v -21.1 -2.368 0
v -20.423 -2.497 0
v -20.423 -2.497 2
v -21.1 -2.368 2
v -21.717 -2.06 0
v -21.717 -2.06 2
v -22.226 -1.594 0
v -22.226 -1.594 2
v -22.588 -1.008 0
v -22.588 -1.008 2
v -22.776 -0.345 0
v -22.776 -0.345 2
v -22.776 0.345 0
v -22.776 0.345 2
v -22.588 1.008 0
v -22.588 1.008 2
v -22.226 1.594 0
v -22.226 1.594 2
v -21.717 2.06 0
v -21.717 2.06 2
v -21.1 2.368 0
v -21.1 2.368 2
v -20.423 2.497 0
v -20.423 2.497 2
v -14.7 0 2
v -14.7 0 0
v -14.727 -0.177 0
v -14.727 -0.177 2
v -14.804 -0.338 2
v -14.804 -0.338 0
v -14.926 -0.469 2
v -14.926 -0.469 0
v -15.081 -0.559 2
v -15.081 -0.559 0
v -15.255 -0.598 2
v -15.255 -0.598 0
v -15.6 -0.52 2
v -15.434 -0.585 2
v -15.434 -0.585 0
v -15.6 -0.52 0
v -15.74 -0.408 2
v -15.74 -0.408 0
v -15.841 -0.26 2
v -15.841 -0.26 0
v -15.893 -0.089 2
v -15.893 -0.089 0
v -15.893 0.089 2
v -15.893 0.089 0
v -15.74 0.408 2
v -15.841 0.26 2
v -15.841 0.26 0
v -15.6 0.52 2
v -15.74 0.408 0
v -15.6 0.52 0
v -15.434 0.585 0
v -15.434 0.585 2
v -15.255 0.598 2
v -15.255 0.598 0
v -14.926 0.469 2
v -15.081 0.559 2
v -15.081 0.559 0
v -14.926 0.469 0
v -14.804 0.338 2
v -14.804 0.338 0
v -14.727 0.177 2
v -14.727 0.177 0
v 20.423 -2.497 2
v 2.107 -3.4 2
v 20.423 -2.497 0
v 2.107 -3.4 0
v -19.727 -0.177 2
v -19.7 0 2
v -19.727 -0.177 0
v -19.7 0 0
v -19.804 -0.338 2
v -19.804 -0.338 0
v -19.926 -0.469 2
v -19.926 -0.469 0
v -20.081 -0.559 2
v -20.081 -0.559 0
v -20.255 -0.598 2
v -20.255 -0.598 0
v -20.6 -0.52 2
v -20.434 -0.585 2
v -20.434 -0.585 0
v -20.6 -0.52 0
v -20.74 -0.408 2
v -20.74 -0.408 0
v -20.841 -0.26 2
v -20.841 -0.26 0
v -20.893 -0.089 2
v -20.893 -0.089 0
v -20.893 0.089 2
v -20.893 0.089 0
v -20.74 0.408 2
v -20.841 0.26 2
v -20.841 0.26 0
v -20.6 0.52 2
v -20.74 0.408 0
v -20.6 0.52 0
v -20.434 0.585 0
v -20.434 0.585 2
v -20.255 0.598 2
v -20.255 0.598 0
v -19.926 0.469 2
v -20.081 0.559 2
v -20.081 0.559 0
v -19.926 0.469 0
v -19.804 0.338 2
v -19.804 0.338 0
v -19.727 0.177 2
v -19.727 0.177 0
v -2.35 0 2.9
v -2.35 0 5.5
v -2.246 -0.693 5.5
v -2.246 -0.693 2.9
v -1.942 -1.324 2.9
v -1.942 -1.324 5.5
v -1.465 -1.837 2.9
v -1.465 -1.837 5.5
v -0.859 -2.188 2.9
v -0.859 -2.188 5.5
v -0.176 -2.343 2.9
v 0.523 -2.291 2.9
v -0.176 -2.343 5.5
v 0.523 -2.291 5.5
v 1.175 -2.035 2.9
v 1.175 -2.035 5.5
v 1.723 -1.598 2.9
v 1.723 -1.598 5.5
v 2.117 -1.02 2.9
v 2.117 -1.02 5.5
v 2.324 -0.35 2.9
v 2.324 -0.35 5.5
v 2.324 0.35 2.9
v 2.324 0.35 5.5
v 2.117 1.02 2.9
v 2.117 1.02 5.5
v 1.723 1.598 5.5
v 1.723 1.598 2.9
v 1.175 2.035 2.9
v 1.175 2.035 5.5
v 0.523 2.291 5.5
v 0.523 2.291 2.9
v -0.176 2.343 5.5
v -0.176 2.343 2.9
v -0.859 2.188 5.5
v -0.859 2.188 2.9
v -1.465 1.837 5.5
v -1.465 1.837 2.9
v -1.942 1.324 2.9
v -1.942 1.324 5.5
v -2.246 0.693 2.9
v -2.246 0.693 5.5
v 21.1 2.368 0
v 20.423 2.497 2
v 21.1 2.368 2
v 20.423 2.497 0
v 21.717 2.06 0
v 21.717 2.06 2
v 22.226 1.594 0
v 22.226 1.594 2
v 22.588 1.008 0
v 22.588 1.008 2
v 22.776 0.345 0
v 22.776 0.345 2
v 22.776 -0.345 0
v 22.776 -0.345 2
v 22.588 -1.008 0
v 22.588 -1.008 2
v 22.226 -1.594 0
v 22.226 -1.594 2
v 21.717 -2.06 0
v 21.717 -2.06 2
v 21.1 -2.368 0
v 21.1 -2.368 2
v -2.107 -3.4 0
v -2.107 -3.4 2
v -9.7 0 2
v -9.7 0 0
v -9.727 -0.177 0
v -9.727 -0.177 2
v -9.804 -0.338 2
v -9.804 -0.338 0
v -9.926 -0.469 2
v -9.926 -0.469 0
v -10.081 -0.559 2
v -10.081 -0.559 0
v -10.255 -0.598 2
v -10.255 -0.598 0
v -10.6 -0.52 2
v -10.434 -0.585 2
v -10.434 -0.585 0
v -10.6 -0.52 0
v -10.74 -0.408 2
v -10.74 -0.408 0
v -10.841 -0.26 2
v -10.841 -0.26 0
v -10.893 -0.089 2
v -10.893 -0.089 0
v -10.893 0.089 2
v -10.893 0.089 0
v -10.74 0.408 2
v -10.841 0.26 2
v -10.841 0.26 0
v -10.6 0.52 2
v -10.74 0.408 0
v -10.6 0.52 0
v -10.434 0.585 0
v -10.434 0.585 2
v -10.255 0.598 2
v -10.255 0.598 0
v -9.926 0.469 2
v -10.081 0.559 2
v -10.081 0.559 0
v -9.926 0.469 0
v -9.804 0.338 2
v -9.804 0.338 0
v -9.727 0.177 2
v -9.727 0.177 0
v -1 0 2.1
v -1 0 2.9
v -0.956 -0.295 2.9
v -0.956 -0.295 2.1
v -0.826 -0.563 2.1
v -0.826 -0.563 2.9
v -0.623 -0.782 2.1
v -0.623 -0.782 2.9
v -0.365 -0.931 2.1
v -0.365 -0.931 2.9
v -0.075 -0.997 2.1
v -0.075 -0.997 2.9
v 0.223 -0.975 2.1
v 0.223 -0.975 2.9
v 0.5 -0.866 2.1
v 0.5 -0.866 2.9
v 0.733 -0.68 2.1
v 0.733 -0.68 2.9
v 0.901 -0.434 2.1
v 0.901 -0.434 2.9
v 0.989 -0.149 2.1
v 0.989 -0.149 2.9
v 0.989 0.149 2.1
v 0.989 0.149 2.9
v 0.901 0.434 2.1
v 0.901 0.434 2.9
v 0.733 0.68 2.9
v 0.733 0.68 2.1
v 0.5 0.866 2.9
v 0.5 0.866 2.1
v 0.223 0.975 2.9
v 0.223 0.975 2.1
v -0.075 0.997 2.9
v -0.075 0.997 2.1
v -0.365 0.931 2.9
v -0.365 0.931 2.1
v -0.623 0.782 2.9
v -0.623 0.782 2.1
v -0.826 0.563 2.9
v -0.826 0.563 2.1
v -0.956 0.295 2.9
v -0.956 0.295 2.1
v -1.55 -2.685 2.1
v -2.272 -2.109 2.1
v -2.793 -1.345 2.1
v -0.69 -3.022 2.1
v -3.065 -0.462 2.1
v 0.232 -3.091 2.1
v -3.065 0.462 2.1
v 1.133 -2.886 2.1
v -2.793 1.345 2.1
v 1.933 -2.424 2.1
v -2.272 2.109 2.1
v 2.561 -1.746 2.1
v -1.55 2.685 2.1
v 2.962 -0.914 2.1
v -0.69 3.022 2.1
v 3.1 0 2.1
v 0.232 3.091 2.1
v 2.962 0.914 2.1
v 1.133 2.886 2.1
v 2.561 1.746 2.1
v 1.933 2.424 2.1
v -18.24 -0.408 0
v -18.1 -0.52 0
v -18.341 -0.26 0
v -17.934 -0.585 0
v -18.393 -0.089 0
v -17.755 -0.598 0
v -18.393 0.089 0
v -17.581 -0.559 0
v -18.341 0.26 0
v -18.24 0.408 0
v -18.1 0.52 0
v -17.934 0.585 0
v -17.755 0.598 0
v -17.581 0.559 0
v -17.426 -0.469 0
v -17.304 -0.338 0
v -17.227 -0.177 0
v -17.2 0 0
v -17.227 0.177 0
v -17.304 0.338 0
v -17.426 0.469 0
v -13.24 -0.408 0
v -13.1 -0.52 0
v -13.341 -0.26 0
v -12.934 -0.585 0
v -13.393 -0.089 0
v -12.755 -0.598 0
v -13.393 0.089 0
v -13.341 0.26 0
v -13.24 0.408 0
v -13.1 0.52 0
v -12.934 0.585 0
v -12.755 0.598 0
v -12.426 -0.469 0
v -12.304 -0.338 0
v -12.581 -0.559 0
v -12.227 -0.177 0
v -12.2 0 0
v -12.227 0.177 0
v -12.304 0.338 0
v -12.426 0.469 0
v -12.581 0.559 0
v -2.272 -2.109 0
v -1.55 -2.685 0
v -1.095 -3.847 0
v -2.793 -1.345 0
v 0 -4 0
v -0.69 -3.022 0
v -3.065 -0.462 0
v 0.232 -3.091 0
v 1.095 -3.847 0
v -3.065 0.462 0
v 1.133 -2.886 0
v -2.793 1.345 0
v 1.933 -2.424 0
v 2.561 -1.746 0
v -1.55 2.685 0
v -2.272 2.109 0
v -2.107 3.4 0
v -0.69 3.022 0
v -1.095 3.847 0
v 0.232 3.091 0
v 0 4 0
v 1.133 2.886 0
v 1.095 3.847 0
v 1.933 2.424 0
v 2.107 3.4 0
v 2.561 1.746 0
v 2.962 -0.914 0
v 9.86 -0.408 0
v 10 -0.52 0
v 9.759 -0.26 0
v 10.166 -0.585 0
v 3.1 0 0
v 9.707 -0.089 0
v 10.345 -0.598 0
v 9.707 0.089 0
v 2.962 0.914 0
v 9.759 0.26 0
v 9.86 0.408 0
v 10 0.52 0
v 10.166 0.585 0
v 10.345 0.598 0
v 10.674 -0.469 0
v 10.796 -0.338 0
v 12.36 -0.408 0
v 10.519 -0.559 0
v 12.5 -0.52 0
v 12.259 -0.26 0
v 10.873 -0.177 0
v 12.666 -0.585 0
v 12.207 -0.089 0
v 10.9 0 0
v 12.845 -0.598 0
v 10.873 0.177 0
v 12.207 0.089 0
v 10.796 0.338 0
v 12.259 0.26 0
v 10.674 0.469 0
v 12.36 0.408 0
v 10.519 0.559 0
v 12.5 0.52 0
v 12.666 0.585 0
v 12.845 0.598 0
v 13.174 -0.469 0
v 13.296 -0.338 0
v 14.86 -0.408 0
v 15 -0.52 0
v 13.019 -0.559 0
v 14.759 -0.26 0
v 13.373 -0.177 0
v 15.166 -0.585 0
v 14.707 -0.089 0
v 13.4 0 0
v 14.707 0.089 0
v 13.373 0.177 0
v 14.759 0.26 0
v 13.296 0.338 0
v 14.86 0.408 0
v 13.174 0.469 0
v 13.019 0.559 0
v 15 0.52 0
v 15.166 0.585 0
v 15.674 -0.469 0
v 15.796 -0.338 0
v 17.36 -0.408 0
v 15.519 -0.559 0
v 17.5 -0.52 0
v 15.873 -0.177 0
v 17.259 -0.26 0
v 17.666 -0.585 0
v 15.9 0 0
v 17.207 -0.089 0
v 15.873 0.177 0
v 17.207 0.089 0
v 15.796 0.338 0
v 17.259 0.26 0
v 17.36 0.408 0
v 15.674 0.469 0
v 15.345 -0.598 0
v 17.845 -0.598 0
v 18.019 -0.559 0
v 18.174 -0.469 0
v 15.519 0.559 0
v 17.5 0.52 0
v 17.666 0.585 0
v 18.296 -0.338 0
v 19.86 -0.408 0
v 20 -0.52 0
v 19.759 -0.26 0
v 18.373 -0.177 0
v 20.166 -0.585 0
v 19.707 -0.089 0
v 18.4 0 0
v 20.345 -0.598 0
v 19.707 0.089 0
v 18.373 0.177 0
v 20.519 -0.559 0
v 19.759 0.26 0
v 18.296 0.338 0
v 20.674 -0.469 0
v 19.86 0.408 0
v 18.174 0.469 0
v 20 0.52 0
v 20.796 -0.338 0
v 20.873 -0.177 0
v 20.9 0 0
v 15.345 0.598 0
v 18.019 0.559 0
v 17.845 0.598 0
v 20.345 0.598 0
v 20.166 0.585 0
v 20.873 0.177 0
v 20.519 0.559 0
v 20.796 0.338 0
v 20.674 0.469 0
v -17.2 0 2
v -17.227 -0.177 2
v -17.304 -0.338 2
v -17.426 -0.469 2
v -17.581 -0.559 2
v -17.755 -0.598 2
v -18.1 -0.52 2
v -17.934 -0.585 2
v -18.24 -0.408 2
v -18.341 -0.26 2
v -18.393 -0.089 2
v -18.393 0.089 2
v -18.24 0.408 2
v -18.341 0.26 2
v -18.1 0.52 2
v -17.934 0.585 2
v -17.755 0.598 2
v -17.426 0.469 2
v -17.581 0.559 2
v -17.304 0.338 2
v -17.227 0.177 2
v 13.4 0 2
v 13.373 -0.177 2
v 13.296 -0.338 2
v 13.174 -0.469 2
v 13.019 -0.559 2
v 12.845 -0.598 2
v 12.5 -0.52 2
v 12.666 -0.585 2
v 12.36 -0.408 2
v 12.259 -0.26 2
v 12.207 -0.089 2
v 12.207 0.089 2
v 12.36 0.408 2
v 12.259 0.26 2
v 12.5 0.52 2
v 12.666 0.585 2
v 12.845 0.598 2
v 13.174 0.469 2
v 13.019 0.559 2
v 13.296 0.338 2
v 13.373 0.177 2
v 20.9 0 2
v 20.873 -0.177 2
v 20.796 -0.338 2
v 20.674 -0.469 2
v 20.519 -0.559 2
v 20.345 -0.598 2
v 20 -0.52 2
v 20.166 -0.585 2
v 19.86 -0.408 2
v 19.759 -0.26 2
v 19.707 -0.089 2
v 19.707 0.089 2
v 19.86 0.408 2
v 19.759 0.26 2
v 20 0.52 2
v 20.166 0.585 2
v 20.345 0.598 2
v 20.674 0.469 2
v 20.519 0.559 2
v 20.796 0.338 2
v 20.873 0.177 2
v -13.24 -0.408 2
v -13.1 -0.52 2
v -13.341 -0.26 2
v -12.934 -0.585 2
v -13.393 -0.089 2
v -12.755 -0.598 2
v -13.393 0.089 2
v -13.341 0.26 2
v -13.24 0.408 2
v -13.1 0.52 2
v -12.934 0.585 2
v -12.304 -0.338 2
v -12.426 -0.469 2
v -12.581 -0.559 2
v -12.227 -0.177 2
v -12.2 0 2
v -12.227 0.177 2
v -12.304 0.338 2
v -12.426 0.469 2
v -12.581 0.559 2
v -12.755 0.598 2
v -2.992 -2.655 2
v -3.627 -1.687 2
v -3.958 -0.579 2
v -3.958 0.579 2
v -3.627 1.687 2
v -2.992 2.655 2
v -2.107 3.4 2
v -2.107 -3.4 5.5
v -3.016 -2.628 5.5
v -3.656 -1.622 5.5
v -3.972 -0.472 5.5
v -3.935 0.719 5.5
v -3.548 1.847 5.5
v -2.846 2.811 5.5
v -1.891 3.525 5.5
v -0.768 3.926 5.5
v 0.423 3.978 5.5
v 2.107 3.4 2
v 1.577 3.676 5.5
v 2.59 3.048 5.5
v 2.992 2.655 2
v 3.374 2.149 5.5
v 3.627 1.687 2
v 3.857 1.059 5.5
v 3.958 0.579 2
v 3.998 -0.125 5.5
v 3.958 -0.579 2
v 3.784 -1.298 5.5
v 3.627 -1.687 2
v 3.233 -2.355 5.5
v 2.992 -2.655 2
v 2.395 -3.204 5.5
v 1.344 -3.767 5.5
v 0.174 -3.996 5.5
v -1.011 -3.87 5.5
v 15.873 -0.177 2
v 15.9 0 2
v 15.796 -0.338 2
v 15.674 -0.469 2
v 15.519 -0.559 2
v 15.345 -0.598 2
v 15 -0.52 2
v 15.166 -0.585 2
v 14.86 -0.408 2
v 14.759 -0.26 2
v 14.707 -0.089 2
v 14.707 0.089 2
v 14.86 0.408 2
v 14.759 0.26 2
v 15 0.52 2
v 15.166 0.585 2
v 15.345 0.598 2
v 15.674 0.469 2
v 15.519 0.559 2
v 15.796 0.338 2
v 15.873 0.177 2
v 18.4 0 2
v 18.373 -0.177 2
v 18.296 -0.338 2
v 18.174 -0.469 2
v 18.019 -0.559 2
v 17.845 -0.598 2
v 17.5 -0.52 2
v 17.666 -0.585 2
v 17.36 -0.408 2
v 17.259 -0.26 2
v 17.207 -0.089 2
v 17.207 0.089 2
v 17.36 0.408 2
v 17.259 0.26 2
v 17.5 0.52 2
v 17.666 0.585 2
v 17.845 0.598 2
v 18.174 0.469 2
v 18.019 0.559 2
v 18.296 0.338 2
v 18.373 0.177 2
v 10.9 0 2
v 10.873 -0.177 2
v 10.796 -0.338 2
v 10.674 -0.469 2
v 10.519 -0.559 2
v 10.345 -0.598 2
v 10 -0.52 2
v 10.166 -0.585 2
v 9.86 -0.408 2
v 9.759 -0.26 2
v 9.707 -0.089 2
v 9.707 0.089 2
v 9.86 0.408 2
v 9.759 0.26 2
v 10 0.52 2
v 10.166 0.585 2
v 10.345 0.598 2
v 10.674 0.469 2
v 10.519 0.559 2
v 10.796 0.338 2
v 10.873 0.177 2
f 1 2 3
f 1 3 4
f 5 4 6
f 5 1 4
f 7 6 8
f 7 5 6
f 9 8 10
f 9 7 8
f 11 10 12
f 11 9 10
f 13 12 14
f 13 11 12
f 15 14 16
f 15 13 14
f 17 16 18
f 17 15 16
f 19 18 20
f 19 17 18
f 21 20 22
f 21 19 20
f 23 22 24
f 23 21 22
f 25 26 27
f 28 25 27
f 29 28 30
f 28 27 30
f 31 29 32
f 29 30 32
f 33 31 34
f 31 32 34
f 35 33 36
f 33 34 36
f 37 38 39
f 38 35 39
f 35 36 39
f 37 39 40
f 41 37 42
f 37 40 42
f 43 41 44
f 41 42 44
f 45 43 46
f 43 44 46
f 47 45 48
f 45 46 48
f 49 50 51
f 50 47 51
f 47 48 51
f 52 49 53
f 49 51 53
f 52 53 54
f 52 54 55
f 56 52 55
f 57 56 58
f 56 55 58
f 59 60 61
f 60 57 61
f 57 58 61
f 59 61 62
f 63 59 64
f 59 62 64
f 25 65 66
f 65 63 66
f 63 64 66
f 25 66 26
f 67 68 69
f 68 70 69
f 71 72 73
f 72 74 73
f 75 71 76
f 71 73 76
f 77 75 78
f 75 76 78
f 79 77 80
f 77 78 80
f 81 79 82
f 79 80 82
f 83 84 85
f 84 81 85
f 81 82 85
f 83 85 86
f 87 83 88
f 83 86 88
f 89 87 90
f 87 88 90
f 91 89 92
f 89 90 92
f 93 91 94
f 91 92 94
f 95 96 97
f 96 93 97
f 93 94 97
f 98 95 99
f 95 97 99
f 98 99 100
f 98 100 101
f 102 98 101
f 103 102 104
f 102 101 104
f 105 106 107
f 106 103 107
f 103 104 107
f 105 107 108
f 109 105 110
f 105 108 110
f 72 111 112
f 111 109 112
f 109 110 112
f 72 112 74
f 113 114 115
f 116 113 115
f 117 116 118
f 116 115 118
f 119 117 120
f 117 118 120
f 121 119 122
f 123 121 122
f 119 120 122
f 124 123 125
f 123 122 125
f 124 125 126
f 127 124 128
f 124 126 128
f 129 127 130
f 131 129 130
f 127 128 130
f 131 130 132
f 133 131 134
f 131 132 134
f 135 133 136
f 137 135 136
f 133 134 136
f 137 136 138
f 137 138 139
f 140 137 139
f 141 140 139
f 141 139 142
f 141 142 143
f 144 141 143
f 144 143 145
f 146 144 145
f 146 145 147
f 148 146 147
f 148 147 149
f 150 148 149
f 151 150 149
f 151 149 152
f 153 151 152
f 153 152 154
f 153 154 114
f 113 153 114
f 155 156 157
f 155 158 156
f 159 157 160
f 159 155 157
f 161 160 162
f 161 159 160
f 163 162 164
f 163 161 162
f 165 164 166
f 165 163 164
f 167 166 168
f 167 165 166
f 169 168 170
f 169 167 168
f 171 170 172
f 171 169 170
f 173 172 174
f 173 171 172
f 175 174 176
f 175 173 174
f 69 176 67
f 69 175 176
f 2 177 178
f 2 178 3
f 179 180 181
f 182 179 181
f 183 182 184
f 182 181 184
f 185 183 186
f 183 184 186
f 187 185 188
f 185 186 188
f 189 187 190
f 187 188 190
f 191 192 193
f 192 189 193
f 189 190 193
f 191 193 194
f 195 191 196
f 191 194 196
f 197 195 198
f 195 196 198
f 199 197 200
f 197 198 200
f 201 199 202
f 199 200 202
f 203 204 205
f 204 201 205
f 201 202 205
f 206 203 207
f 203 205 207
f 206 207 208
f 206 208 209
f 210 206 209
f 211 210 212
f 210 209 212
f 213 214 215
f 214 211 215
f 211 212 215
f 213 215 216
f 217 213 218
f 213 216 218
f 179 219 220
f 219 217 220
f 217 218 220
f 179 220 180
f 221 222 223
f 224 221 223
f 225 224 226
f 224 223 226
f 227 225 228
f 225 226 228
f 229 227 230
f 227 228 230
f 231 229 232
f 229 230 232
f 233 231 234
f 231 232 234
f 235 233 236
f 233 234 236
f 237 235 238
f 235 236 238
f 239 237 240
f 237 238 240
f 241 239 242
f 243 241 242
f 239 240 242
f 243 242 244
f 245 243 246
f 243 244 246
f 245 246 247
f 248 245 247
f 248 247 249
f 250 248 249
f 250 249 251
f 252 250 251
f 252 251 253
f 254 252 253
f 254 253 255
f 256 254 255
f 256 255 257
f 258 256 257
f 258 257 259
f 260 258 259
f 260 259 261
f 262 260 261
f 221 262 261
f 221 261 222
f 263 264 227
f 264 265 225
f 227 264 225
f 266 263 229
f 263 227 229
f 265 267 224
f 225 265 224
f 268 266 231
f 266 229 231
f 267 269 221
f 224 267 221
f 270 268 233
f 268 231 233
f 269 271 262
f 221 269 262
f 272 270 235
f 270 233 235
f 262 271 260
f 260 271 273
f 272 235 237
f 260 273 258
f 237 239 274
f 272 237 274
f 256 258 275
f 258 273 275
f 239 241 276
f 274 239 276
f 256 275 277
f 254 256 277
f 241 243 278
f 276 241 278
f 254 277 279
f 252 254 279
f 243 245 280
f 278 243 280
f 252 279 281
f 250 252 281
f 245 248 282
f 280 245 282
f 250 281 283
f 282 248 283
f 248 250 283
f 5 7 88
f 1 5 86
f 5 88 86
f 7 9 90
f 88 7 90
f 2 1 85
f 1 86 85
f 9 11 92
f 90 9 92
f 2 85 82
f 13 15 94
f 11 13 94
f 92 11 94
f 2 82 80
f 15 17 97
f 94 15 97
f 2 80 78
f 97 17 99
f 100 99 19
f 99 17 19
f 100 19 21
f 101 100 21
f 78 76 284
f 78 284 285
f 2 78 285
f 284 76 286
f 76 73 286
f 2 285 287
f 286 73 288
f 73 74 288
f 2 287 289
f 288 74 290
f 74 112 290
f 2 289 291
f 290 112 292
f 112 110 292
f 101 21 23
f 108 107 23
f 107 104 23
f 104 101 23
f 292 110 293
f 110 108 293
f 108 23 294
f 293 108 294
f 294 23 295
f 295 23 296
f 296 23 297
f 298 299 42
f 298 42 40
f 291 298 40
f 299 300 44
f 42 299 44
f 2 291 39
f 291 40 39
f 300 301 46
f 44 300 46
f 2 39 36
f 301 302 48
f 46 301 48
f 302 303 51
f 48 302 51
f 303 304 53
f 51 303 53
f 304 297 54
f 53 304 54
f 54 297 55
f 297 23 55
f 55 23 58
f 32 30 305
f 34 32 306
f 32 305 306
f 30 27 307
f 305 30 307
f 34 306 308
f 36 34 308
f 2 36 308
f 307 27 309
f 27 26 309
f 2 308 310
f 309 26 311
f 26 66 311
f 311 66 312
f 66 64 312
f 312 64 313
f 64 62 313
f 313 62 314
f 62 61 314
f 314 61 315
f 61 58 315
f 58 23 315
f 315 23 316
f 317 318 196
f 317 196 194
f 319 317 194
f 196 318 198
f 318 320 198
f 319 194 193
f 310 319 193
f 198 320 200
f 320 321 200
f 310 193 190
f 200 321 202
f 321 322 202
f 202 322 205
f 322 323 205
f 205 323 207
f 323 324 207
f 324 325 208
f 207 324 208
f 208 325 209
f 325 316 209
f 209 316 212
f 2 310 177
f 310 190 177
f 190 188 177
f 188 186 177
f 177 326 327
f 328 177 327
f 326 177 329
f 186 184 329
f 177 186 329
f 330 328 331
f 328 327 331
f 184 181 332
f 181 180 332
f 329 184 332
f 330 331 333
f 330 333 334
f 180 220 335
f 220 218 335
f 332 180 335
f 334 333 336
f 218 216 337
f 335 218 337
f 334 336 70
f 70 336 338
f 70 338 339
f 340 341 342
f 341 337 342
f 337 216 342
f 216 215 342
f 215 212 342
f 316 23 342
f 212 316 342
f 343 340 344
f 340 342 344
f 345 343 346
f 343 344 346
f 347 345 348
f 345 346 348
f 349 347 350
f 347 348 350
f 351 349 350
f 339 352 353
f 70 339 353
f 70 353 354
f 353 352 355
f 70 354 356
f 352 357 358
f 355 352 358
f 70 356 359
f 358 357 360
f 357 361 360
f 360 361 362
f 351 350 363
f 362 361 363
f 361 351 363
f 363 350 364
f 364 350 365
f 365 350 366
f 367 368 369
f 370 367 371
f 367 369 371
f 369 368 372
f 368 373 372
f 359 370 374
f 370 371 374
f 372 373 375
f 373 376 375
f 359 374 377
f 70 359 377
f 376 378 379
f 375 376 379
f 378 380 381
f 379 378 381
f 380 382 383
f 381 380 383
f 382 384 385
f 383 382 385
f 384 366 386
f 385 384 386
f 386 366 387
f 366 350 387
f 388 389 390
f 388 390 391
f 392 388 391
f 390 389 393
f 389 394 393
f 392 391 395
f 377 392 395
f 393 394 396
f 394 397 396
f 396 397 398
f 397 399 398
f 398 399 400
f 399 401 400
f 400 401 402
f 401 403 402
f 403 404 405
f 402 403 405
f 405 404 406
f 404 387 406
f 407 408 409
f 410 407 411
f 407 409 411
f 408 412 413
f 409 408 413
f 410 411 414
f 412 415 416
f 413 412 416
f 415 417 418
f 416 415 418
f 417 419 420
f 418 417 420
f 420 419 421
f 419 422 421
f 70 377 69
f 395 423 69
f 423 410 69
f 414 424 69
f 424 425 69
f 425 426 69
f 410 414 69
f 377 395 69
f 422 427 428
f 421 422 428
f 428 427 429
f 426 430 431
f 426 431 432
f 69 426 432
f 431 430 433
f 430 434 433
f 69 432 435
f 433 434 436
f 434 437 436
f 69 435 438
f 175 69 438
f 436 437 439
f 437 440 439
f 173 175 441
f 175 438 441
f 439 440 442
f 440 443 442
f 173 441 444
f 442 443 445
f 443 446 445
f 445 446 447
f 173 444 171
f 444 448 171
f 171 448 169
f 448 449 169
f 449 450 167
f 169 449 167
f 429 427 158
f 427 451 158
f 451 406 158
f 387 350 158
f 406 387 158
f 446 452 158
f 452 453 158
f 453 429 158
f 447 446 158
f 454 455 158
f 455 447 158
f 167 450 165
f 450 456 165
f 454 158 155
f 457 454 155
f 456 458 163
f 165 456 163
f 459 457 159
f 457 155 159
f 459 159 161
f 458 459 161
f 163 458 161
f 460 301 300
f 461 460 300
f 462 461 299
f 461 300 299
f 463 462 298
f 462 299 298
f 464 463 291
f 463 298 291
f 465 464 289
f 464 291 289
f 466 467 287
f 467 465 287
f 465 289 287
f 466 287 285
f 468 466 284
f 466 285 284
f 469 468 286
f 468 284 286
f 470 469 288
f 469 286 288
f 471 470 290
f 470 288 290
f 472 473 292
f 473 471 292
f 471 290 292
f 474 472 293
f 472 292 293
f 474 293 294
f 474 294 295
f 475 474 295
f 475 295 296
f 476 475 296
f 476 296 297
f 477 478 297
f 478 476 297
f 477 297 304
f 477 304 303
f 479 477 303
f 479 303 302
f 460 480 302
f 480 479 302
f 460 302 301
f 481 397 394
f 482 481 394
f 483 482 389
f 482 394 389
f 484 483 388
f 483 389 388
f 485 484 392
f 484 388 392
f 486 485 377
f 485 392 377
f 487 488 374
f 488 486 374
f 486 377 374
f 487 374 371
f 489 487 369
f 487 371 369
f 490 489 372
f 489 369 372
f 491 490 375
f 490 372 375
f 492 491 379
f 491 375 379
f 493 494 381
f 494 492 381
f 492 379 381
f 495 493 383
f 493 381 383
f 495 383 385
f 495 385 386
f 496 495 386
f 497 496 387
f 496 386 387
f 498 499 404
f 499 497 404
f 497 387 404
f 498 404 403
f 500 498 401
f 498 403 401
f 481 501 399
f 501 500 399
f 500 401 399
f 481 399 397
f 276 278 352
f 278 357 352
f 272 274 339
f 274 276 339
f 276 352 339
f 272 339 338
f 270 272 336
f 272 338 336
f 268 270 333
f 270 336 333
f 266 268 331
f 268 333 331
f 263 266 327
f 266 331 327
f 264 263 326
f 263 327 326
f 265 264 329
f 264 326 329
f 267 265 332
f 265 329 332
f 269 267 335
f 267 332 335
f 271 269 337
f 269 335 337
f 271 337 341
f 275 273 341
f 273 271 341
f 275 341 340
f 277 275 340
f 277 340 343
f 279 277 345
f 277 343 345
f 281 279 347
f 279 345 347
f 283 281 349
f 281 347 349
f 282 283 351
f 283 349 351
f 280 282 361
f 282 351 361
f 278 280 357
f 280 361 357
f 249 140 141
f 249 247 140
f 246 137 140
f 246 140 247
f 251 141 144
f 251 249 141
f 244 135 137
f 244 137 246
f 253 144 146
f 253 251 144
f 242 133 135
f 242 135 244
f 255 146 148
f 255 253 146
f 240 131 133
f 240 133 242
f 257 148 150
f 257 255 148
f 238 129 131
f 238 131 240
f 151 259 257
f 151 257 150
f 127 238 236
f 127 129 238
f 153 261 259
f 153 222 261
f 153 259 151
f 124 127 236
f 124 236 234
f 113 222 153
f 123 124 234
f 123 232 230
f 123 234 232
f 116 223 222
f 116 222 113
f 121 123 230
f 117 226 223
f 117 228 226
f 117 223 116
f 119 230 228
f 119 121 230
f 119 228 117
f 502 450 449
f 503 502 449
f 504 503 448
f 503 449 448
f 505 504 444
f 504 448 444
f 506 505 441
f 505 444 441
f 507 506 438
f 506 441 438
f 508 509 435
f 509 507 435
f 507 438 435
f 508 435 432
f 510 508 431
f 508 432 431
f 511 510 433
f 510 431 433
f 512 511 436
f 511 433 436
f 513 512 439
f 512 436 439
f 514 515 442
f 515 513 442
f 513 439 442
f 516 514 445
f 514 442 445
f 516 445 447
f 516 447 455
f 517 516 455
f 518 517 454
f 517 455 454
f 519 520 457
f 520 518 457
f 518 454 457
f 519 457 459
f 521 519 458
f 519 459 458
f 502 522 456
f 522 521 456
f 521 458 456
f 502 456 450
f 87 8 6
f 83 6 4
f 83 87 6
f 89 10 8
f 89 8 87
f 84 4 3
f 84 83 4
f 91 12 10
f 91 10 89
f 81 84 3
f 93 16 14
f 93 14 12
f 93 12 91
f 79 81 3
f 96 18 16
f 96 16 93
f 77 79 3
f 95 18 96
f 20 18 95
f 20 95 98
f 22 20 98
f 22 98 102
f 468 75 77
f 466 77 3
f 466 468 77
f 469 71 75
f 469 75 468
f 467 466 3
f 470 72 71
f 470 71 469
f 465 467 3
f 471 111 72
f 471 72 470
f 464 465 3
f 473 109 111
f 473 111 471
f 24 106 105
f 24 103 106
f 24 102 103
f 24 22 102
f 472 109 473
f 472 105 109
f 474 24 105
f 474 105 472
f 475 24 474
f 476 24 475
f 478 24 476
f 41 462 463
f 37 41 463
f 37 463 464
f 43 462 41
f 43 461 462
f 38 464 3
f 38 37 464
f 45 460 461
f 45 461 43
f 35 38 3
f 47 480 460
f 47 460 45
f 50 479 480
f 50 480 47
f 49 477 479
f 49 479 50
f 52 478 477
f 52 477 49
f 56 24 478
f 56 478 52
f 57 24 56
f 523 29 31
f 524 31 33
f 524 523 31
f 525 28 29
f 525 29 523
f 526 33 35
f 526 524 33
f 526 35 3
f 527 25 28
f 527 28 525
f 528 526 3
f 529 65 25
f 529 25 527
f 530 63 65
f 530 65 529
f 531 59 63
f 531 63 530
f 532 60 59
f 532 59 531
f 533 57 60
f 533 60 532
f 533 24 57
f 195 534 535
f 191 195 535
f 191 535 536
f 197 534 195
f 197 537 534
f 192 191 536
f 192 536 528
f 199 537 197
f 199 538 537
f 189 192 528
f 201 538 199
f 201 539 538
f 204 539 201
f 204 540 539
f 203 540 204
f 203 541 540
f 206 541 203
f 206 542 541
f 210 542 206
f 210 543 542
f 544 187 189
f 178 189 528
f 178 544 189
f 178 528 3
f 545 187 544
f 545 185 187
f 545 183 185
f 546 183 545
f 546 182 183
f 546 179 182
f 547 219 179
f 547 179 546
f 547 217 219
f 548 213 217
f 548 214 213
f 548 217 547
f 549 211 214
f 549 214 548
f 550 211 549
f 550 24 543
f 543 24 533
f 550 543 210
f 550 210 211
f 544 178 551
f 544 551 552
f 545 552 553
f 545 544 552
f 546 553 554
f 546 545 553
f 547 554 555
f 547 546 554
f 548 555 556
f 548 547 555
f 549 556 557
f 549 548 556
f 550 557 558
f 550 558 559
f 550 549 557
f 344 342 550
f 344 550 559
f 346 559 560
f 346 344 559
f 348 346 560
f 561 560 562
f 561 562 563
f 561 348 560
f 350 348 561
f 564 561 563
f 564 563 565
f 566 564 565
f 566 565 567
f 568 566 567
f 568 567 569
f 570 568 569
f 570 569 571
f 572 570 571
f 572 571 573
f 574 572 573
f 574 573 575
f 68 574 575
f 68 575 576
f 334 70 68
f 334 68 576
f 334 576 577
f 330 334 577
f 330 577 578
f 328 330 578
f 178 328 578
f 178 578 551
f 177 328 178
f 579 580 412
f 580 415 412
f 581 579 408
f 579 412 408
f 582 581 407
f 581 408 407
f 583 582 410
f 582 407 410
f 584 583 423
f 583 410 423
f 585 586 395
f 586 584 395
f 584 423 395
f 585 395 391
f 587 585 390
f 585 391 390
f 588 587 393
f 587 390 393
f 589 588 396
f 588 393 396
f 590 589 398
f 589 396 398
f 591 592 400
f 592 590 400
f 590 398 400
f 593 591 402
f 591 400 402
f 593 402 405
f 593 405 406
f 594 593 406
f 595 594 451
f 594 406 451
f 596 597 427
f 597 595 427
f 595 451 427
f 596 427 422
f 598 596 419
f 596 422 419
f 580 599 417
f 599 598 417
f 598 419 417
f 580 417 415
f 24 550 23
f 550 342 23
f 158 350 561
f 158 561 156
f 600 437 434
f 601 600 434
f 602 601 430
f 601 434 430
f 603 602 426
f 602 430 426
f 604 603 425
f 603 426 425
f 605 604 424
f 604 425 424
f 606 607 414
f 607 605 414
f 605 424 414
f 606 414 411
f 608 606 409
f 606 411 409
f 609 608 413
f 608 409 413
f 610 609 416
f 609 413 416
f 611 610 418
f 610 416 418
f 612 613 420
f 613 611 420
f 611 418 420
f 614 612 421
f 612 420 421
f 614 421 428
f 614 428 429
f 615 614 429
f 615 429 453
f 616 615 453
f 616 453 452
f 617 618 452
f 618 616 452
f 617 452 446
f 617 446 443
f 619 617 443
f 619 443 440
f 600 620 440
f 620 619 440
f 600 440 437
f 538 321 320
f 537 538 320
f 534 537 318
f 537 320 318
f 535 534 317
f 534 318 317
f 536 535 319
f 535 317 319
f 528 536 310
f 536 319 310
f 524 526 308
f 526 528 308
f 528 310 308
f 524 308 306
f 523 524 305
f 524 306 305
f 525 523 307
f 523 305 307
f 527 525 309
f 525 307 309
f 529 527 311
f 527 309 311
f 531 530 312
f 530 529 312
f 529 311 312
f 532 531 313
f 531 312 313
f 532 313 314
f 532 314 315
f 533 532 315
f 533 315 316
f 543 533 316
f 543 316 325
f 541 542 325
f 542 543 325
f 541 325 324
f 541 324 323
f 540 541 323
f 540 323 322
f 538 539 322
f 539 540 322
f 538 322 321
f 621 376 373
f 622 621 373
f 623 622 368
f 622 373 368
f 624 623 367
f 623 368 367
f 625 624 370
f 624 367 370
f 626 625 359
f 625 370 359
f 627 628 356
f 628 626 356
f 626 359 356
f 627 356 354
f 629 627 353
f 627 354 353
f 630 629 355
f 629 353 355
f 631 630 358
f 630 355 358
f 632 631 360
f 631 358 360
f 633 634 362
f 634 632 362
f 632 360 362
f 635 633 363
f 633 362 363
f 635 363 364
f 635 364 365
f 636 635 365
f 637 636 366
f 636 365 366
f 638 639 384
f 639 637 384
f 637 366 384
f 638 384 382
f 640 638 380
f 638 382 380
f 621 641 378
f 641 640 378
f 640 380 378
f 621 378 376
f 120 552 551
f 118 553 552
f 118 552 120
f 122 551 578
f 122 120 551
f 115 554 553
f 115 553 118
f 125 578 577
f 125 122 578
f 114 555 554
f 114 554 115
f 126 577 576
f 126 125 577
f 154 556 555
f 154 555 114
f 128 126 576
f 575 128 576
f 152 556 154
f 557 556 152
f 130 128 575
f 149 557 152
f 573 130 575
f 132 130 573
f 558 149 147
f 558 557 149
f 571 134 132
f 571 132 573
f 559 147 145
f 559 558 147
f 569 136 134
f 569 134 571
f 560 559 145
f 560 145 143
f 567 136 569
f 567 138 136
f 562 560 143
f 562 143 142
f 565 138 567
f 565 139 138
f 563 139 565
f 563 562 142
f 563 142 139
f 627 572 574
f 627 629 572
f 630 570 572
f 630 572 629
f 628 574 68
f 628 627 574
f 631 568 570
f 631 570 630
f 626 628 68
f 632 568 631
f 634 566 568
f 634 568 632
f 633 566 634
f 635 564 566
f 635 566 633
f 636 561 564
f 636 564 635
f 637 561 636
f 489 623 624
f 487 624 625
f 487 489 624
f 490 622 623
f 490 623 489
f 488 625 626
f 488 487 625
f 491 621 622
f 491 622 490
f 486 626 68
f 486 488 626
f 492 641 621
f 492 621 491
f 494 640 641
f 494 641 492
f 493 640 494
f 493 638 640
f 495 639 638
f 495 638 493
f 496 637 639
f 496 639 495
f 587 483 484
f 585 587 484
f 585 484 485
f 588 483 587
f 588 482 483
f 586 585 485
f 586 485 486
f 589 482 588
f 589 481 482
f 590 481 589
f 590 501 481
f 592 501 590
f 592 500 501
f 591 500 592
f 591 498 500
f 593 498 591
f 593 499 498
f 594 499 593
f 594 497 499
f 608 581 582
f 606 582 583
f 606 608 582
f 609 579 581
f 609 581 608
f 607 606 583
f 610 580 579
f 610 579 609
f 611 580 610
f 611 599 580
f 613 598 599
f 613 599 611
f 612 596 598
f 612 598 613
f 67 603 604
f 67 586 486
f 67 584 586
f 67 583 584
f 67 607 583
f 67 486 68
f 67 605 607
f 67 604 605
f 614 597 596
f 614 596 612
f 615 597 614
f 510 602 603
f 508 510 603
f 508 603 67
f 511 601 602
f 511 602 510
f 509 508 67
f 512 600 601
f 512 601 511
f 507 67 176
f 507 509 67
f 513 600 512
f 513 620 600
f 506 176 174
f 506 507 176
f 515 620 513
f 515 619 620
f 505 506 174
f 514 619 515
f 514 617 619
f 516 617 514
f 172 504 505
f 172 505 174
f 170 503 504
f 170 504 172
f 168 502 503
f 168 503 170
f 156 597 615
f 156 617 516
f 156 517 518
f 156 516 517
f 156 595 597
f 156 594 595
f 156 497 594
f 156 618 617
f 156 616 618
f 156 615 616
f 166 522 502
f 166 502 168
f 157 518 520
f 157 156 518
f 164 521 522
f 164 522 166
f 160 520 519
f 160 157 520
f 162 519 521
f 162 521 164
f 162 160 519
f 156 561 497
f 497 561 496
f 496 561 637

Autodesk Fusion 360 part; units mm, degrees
sketch "スケッチ1" plane through (0, 0, 0) normal (0, 0, 1) x (1, 0, 0)
  line L0 (2.1071, 3.4) -> (-2.1071, 3.4) construction
  line L1 (-2.1071, -3.4) -> (2.1071, -3.4) construction
  line L2 (22.8, 3.4) -> (-22.8, 3.4) construction
  line L3 (-22.8, 3.4) -> (-22.8, -3.4) construction
  line L4 (-22.8, -3.4) -> (22.8, -3.4) construction
  line L5 (22.8, -3.4) -> (22.8, 3.4) construction
  line L6 (22.8, 3.4) -> (-22.8, -3.4) construction
  line L7 (-22.8, 3.4) -> (22.8, -3.4) construction
  line L8 (-2.1071, 3.4) -> (-20.4231, 2.497)
  line L9 (-2.1071, -3.4) -> (-20.4231, -2.497)
  line L10 (2.1071, 3.4) -> (20.4231, 2.497)
  line L11 (2.1071, -3.4) -> (20.4231, -2.497)
  arc A0 (-20.4231, 2.497) -> (-20.4231, -2.497) centre (-20.3, 0) ccw
  arc A1 (20.4231, -2.497) -> (20.4231, 2.497) centre (20.3, 0) ccw
  arc A2 (2.1071, 3.4) -> (-2.1071, 3.4) centre (0, 0) ccw
  arc A3 (-2.1071, 3.4) -> (-2.1071, -3.4) centre (0, 0) ccw
  arc A4 (2.1071, -3.4) -> (2.1071, 3.4) centre (0, 0) ccw
  arc A5 (-2.1071, -3.4) -> (2.1071, -3.4) centre (0, 0) ccw
  line L12 (-2.1071, 3.4) -> (2.1071, 3.4)
  line L13 (-2.1071, -3.4) -> (2.1071, -3.4)
  circle A6 centre (-20.3, 0) radius 0.6
  circle A7 centre (-17.8, 0) radius 0.6
  circle A8 centre (-15.3, 0) radius 0.6
  circle A9 centre (-12.8, 0) radius 0.6
  circle A10 centre (-10.3, 0) radius 0.6
  line L14 (0, 1.75) -> (0, 22.5) construction
  circle A11 centre (10.3, 0) radius 0.6
  circle A12 centre (12.8, 0) radius 0.6
  circle A13 centre (15.3, 0) radius 0.6
  circle A14 centre (17.8, 0) radius 0.6
  circle A15 centre (20.3, 0) radius 0.6
  dimension "d1" = 8
  dimension "d5" = 6.8
  dimension "d6" = 45.6
  dimension "d7" = 6.8
  dimension "d8" = 2.5
  dimension "d9" = 2.5
  dimension "d10" = 1.2
  dimension "d11" = 2.5
  dimension "d14" = 2.5
  dimension "d15" = 0
  dimension "d16" = 10
extrude "押し出し1" add sketch "スケッチ1" along normal blind 5.5 contours A3 A4 L12 L13 | A2 L12 | A5 L13 makes body 1
extrude "押し出し2" add sketch "スケッチ1" along normal blind 2 contours L8 L9 A0 A3 | L10 L11 A1 A4 bodies 1
sketch "スケッチ2" plane through (0, 0, 5.5) normal (0, 0, 1) x (-1, 0, 0)
  circle A0 centre (0, 0) radius 4
  circle A1 centre (0, 0) radius 1
  circle A2 centre (0, 0) radius 2.35
  dimension "d23" = 2
  dimension "d24" = 4.7
extrude "押し出し3" cut sketch "スケッチ2" against normal through all contours A1 bodies 1
extrude "押し出し4" cut sketch "スケッチ2" against normal blind 2.6 contours A2 bodies 1
sketch "スケッチ3" plane through (0, 0, 0) normal (0, 0, 1) x (1, 0, 0)
  circle A0 centre (0, 0) radius 3.1
  dimension "d28" = 6.2
extrude "押し出し5" cut sketch "スケッチ3" along normal blind 2.1 bodies 1
copy_body "ボディ -> コンポーネント1" bodies 1 removing the originals makes body 2 in component "Component'"
component "Component'" placed x (1, 0, 0) y (0, 1, 0) z (0, 0, 1) at (0, 0, 0)
